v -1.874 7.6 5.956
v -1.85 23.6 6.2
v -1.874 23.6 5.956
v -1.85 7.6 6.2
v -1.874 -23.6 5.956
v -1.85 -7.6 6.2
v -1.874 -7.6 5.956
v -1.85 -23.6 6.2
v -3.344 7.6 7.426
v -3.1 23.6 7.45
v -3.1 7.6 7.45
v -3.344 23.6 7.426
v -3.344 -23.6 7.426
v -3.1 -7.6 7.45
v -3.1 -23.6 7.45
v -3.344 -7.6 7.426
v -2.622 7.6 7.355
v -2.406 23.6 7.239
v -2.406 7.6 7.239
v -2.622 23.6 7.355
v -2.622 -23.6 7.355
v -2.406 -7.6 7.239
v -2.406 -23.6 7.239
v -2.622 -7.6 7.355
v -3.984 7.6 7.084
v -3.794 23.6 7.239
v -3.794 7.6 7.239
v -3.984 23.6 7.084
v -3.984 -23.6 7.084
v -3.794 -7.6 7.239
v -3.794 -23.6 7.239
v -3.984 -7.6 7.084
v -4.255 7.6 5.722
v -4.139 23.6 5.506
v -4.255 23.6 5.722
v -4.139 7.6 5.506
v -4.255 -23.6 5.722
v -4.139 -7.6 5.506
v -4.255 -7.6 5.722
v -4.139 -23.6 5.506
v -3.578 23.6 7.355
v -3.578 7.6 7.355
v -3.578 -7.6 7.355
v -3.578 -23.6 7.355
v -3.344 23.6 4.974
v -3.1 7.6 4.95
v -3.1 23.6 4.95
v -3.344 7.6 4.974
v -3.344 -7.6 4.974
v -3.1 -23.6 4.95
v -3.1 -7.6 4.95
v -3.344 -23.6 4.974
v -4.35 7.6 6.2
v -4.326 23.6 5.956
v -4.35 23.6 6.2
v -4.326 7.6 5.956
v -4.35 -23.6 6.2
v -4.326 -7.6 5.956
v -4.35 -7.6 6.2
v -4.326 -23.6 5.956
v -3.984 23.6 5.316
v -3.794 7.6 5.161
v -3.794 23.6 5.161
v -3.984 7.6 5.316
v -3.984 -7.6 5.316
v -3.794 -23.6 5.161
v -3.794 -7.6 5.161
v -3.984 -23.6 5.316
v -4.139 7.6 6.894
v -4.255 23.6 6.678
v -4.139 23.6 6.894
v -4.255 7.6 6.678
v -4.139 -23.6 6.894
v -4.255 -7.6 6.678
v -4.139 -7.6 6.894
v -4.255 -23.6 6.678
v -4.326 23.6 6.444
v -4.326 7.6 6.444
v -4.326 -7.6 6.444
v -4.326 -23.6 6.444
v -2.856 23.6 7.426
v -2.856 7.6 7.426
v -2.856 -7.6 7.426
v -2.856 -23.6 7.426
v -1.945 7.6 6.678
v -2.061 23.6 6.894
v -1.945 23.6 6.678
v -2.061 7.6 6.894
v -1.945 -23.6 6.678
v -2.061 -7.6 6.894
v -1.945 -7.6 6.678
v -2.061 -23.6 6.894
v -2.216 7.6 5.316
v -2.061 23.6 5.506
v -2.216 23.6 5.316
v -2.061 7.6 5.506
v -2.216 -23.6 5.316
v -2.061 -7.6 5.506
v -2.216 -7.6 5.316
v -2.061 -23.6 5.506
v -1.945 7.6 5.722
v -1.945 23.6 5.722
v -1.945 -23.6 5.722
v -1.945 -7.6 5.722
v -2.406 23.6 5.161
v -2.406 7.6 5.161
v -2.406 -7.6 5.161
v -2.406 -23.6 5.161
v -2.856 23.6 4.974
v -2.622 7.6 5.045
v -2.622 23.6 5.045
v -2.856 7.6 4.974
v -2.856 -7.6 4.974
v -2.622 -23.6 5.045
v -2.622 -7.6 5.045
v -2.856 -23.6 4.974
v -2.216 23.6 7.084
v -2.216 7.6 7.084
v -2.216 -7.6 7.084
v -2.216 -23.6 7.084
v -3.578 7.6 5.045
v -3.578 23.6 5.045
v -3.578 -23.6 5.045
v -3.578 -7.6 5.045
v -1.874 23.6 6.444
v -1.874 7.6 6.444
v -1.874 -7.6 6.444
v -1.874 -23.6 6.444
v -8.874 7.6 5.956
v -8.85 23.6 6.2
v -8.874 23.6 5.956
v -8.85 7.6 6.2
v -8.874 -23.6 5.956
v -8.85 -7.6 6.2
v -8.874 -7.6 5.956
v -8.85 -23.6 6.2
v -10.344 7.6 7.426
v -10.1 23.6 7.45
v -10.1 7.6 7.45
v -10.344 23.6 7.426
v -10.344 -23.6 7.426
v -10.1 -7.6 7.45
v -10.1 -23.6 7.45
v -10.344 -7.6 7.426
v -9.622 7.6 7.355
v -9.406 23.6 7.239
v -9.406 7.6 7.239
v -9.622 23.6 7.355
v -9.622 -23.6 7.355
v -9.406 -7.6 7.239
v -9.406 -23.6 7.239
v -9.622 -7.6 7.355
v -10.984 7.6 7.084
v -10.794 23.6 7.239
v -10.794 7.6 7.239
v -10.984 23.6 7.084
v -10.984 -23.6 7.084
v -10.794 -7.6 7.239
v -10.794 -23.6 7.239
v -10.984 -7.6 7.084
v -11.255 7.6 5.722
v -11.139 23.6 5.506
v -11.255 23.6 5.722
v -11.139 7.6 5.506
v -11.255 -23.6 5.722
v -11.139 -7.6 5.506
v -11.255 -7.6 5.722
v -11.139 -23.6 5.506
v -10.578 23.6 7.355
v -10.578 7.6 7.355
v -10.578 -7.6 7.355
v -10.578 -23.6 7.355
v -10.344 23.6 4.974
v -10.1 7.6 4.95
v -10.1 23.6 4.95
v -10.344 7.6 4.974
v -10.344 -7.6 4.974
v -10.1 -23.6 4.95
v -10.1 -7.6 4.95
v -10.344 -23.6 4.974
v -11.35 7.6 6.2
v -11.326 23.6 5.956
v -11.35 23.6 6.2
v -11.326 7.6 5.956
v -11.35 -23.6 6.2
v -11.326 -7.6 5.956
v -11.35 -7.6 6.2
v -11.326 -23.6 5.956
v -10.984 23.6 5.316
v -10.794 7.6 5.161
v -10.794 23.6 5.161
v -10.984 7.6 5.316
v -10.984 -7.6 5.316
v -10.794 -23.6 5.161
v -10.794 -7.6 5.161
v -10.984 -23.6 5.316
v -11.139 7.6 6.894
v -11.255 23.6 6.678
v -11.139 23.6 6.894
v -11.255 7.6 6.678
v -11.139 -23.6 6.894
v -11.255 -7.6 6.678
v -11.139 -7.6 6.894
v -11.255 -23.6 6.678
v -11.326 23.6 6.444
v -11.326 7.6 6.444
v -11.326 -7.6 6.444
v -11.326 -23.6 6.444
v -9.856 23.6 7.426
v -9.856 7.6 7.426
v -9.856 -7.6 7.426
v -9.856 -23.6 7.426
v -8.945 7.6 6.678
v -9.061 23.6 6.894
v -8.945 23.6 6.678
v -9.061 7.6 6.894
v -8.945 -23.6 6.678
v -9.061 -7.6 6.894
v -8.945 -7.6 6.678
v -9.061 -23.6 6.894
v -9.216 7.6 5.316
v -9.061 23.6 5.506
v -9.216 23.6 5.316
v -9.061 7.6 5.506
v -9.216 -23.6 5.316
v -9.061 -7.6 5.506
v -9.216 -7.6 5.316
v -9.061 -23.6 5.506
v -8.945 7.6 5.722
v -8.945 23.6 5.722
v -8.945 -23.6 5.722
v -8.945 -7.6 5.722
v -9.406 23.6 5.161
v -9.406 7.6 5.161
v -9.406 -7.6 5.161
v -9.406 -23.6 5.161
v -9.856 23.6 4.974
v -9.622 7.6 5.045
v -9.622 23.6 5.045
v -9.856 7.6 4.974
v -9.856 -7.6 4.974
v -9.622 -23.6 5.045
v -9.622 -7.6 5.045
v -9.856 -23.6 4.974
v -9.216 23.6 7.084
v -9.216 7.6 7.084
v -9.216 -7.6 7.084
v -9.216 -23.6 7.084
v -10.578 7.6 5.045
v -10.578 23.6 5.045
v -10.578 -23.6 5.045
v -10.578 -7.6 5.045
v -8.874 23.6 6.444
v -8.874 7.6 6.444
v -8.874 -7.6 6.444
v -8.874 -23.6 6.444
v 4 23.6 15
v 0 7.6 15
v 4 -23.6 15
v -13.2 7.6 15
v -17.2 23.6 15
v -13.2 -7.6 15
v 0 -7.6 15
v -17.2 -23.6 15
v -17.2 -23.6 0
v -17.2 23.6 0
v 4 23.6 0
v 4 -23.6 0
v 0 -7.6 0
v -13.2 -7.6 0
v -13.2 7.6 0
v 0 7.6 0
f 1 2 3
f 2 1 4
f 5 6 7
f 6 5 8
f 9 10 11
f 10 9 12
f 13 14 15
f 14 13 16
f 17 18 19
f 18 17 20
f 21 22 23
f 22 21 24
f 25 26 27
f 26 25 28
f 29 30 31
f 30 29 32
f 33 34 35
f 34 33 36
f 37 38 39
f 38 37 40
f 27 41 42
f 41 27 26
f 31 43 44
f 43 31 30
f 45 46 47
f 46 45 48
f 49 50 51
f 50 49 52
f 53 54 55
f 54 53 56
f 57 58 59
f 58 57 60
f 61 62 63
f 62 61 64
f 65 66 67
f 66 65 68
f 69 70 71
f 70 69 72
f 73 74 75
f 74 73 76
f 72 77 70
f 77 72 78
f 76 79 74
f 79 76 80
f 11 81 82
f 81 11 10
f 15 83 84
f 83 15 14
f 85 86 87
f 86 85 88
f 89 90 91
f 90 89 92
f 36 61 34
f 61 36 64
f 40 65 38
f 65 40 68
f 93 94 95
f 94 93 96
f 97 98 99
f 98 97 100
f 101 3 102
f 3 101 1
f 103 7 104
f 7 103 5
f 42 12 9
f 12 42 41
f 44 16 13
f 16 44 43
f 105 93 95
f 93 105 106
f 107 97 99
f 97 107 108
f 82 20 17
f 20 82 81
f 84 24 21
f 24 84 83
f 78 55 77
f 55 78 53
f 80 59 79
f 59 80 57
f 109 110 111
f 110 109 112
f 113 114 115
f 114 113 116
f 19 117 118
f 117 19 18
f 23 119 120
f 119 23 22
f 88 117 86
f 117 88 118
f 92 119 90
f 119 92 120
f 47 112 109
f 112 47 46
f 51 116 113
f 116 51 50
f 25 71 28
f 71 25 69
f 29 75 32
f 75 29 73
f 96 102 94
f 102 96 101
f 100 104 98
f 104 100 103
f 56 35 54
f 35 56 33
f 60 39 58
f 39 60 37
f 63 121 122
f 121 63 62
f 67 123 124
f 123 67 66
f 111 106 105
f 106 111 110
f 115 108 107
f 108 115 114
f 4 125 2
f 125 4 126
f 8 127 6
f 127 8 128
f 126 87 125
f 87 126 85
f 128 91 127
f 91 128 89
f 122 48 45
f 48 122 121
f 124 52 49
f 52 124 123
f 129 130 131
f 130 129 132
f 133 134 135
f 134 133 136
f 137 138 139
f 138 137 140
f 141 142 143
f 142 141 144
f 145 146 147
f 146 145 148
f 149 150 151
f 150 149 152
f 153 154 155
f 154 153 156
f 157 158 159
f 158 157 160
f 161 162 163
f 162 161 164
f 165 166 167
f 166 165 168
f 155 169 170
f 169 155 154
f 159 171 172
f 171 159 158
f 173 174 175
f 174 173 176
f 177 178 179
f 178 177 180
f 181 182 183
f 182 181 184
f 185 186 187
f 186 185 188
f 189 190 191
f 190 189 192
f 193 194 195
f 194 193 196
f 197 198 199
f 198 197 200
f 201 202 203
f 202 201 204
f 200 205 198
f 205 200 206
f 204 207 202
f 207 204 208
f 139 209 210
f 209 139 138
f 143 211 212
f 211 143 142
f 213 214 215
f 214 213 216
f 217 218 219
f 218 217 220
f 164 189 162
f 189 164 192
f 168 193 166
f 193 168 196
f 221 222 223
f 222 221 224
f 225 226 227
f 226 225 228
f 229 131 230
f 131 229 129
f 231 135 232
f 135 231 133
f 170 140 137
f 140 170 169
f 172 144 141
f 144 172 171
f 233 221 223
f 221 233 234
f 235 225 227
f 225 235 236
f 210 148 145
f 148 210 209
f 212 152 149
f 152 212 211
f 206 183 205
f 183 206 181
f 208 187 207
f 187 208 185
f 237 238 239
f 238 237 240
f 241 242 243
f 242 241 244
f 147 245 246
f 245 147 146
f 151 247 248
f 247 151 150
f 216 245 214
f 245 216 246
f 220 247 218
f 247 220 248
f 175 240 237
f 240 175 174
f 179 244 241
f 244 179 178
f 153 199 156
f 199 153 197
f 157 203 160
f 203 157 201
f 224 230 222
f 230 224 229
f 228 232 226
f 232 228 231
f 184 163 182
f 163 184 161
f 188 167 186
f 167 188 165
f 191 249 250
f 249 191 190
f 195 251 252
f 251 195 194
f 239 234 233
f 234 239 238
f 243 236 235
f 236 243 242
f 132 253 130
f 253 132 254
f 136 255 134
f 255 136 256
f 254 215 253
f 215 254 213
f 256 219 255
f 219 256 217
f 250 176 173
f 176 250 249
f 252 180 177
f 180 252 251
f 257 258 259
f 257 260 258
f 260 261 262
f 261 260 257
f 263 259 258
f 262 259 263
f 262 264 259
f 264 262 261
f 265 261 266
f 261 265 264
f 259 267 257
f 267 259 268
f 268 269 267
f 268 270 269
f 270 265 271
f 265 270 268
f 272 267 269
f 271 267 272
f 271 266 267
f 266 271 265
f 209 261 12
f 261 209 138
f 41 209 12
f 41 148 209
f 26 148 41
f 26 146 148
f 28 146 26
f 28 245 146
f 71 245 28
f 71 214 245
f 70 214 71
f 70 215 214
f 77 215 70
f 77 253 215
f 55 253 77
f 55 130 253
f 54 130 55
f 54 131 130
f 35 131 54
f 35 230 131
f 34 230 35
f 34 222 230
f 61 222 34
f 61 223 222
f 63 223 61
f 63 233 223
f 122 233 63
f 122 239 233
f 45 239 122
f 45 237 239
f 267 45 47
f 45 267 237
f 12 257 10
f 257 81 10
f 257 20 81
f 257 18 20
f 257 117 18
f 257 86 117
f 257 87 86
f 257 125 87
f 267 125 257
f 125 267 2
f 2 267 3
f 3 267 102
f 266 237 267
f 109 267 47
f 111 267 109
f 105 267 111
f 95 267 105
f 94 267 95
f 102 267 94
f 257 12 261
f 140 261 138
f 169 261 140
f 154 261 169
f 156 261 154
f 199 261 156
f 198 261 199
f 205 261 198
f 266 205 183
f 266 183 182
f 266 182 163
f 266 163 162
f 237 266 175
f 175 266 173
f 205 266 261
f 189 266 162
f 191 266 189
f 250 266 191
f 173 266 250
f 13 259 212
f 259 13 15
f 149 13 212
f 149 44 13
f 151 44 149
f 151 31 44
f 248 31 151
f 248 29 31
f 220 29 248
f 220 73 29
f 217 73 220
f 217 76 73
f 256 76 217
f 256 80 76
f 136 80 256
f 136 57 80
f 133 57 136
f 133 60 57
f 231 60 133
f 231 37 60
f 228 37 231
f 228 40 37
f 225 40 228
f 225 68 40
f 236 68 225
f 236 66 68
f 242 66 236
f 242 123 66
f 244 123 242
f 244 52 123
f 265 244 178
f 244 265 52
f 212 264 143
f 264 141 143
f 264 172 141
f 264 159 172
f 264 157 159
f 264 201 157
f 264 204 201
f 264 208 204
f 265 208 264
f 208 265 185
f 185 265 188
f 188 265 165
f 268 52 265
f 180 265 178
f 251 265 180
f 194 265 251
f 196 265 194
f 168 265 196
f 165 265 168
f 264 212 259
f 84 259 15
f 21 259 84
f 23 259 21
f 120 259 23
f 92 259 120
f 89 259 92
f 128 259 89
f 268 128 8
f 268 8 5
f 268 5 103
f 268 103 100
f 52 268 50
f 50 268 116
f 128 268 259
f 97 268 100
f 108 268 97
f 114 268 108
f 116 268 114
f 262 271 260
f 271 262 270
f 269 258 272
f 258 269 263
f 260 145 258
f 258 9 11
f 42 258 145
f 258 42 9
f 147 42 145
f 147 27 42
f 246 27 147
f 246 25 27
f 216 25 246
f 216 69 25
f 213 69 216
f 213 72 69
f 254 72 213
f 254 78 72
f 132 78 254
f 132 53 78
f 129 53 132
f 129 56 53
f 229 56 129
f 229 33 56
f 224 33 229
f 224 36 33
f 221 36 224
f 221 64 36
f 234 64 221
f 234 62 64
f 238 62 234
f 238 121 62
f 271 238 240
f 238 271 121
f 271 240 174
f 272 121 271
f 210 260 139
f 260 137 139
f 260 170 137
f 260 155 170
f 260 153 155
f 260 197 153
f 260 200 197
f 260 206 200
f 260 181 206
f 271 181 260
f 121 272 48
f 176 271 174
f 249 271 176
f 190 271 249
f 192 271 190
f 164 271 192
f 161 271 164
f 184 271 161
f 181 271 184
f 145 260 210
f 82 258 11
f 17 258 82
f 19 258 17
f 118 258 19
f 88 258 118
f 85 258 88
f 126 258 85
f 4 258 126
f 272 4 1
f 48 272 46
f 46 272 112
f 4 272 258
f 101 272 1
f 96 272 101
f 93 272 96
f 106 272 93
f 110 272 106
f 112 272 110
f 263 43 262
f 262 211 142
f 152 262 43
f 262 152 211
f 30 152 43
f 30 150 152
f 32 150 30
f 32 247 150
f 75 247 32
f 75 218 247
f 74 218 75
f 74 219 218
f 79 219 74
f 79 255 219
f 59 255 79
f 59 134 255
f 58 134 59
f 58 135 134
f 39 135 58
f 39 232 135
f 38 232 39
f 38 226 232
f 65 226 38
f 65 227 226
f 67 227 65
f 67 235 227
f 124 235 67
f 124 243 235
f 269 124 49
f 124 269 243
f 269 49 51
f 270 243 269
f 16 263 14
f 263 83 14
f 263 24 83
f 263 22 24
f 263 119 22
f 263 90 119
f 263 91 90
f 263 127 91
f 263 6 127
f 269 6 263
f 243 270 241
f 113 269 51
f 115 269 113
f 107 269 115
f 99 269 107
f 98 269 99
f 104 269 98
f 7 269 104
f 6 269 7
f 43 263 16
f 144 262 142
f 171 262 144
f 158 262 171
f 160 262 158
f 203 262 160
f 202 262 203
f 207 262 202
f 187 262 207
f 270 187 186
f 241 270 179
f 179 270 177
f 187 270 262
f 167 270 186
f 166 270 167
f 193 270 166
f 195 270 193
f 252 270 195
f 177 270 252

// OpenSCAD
$fn=32;

bar_w = 15+0.2;
bar_h = 13+0.2;

wall1 = 4;
wall2 = 16;

//l1 = 10;
//l2 = 15;

//l1 = 5;
//l2 = 5;

l = 15;

eps=0.1;

hole_space=7;
hole_offset = 6.2;
//hole_height=3;
//h//ole_depth=10;

release_d = 2;

hole_d=2.5;

module main() {
  difference() {
    translate([0, -bar_w/2-wall2, -wall1]) 
      cube([l, bar_w+2*wall2, bar_h+2*wall1]);
    
    translate([-eps, -bar_w/2, ]) cube([l+2*eps, bar_w, bar_h]);


for (i = [-1:2:1]) {
   translate([hole_offset, bar_w/2+wall2+eps, bar_h/2+i*hole_space/2]) rotate([90, 0, 0]) cylinder(d=hole_d, h=bar_w+2*wall2+2*eps);
}
//    for (i = [-1:2:1]) {
//     translate([-eps, i*hole_space/2, hole_height]) rotate([0, 90, 0]) cylinder(d=d, h=l2 + 2*eps);
//    
//    
//    translate([l2, i*bar_w/2, 0]) rotate([0, 90, 0]) cylinder(d=release_d, h=l1+eps);
//      
//        translate([l2, i*bar_w/2, bar_h]) rotate([0, 90, 0]) cylinder(d=release_d, h=l1+eps);
//    }
  }
}

rotate([0, -90, 0]) 
main();
